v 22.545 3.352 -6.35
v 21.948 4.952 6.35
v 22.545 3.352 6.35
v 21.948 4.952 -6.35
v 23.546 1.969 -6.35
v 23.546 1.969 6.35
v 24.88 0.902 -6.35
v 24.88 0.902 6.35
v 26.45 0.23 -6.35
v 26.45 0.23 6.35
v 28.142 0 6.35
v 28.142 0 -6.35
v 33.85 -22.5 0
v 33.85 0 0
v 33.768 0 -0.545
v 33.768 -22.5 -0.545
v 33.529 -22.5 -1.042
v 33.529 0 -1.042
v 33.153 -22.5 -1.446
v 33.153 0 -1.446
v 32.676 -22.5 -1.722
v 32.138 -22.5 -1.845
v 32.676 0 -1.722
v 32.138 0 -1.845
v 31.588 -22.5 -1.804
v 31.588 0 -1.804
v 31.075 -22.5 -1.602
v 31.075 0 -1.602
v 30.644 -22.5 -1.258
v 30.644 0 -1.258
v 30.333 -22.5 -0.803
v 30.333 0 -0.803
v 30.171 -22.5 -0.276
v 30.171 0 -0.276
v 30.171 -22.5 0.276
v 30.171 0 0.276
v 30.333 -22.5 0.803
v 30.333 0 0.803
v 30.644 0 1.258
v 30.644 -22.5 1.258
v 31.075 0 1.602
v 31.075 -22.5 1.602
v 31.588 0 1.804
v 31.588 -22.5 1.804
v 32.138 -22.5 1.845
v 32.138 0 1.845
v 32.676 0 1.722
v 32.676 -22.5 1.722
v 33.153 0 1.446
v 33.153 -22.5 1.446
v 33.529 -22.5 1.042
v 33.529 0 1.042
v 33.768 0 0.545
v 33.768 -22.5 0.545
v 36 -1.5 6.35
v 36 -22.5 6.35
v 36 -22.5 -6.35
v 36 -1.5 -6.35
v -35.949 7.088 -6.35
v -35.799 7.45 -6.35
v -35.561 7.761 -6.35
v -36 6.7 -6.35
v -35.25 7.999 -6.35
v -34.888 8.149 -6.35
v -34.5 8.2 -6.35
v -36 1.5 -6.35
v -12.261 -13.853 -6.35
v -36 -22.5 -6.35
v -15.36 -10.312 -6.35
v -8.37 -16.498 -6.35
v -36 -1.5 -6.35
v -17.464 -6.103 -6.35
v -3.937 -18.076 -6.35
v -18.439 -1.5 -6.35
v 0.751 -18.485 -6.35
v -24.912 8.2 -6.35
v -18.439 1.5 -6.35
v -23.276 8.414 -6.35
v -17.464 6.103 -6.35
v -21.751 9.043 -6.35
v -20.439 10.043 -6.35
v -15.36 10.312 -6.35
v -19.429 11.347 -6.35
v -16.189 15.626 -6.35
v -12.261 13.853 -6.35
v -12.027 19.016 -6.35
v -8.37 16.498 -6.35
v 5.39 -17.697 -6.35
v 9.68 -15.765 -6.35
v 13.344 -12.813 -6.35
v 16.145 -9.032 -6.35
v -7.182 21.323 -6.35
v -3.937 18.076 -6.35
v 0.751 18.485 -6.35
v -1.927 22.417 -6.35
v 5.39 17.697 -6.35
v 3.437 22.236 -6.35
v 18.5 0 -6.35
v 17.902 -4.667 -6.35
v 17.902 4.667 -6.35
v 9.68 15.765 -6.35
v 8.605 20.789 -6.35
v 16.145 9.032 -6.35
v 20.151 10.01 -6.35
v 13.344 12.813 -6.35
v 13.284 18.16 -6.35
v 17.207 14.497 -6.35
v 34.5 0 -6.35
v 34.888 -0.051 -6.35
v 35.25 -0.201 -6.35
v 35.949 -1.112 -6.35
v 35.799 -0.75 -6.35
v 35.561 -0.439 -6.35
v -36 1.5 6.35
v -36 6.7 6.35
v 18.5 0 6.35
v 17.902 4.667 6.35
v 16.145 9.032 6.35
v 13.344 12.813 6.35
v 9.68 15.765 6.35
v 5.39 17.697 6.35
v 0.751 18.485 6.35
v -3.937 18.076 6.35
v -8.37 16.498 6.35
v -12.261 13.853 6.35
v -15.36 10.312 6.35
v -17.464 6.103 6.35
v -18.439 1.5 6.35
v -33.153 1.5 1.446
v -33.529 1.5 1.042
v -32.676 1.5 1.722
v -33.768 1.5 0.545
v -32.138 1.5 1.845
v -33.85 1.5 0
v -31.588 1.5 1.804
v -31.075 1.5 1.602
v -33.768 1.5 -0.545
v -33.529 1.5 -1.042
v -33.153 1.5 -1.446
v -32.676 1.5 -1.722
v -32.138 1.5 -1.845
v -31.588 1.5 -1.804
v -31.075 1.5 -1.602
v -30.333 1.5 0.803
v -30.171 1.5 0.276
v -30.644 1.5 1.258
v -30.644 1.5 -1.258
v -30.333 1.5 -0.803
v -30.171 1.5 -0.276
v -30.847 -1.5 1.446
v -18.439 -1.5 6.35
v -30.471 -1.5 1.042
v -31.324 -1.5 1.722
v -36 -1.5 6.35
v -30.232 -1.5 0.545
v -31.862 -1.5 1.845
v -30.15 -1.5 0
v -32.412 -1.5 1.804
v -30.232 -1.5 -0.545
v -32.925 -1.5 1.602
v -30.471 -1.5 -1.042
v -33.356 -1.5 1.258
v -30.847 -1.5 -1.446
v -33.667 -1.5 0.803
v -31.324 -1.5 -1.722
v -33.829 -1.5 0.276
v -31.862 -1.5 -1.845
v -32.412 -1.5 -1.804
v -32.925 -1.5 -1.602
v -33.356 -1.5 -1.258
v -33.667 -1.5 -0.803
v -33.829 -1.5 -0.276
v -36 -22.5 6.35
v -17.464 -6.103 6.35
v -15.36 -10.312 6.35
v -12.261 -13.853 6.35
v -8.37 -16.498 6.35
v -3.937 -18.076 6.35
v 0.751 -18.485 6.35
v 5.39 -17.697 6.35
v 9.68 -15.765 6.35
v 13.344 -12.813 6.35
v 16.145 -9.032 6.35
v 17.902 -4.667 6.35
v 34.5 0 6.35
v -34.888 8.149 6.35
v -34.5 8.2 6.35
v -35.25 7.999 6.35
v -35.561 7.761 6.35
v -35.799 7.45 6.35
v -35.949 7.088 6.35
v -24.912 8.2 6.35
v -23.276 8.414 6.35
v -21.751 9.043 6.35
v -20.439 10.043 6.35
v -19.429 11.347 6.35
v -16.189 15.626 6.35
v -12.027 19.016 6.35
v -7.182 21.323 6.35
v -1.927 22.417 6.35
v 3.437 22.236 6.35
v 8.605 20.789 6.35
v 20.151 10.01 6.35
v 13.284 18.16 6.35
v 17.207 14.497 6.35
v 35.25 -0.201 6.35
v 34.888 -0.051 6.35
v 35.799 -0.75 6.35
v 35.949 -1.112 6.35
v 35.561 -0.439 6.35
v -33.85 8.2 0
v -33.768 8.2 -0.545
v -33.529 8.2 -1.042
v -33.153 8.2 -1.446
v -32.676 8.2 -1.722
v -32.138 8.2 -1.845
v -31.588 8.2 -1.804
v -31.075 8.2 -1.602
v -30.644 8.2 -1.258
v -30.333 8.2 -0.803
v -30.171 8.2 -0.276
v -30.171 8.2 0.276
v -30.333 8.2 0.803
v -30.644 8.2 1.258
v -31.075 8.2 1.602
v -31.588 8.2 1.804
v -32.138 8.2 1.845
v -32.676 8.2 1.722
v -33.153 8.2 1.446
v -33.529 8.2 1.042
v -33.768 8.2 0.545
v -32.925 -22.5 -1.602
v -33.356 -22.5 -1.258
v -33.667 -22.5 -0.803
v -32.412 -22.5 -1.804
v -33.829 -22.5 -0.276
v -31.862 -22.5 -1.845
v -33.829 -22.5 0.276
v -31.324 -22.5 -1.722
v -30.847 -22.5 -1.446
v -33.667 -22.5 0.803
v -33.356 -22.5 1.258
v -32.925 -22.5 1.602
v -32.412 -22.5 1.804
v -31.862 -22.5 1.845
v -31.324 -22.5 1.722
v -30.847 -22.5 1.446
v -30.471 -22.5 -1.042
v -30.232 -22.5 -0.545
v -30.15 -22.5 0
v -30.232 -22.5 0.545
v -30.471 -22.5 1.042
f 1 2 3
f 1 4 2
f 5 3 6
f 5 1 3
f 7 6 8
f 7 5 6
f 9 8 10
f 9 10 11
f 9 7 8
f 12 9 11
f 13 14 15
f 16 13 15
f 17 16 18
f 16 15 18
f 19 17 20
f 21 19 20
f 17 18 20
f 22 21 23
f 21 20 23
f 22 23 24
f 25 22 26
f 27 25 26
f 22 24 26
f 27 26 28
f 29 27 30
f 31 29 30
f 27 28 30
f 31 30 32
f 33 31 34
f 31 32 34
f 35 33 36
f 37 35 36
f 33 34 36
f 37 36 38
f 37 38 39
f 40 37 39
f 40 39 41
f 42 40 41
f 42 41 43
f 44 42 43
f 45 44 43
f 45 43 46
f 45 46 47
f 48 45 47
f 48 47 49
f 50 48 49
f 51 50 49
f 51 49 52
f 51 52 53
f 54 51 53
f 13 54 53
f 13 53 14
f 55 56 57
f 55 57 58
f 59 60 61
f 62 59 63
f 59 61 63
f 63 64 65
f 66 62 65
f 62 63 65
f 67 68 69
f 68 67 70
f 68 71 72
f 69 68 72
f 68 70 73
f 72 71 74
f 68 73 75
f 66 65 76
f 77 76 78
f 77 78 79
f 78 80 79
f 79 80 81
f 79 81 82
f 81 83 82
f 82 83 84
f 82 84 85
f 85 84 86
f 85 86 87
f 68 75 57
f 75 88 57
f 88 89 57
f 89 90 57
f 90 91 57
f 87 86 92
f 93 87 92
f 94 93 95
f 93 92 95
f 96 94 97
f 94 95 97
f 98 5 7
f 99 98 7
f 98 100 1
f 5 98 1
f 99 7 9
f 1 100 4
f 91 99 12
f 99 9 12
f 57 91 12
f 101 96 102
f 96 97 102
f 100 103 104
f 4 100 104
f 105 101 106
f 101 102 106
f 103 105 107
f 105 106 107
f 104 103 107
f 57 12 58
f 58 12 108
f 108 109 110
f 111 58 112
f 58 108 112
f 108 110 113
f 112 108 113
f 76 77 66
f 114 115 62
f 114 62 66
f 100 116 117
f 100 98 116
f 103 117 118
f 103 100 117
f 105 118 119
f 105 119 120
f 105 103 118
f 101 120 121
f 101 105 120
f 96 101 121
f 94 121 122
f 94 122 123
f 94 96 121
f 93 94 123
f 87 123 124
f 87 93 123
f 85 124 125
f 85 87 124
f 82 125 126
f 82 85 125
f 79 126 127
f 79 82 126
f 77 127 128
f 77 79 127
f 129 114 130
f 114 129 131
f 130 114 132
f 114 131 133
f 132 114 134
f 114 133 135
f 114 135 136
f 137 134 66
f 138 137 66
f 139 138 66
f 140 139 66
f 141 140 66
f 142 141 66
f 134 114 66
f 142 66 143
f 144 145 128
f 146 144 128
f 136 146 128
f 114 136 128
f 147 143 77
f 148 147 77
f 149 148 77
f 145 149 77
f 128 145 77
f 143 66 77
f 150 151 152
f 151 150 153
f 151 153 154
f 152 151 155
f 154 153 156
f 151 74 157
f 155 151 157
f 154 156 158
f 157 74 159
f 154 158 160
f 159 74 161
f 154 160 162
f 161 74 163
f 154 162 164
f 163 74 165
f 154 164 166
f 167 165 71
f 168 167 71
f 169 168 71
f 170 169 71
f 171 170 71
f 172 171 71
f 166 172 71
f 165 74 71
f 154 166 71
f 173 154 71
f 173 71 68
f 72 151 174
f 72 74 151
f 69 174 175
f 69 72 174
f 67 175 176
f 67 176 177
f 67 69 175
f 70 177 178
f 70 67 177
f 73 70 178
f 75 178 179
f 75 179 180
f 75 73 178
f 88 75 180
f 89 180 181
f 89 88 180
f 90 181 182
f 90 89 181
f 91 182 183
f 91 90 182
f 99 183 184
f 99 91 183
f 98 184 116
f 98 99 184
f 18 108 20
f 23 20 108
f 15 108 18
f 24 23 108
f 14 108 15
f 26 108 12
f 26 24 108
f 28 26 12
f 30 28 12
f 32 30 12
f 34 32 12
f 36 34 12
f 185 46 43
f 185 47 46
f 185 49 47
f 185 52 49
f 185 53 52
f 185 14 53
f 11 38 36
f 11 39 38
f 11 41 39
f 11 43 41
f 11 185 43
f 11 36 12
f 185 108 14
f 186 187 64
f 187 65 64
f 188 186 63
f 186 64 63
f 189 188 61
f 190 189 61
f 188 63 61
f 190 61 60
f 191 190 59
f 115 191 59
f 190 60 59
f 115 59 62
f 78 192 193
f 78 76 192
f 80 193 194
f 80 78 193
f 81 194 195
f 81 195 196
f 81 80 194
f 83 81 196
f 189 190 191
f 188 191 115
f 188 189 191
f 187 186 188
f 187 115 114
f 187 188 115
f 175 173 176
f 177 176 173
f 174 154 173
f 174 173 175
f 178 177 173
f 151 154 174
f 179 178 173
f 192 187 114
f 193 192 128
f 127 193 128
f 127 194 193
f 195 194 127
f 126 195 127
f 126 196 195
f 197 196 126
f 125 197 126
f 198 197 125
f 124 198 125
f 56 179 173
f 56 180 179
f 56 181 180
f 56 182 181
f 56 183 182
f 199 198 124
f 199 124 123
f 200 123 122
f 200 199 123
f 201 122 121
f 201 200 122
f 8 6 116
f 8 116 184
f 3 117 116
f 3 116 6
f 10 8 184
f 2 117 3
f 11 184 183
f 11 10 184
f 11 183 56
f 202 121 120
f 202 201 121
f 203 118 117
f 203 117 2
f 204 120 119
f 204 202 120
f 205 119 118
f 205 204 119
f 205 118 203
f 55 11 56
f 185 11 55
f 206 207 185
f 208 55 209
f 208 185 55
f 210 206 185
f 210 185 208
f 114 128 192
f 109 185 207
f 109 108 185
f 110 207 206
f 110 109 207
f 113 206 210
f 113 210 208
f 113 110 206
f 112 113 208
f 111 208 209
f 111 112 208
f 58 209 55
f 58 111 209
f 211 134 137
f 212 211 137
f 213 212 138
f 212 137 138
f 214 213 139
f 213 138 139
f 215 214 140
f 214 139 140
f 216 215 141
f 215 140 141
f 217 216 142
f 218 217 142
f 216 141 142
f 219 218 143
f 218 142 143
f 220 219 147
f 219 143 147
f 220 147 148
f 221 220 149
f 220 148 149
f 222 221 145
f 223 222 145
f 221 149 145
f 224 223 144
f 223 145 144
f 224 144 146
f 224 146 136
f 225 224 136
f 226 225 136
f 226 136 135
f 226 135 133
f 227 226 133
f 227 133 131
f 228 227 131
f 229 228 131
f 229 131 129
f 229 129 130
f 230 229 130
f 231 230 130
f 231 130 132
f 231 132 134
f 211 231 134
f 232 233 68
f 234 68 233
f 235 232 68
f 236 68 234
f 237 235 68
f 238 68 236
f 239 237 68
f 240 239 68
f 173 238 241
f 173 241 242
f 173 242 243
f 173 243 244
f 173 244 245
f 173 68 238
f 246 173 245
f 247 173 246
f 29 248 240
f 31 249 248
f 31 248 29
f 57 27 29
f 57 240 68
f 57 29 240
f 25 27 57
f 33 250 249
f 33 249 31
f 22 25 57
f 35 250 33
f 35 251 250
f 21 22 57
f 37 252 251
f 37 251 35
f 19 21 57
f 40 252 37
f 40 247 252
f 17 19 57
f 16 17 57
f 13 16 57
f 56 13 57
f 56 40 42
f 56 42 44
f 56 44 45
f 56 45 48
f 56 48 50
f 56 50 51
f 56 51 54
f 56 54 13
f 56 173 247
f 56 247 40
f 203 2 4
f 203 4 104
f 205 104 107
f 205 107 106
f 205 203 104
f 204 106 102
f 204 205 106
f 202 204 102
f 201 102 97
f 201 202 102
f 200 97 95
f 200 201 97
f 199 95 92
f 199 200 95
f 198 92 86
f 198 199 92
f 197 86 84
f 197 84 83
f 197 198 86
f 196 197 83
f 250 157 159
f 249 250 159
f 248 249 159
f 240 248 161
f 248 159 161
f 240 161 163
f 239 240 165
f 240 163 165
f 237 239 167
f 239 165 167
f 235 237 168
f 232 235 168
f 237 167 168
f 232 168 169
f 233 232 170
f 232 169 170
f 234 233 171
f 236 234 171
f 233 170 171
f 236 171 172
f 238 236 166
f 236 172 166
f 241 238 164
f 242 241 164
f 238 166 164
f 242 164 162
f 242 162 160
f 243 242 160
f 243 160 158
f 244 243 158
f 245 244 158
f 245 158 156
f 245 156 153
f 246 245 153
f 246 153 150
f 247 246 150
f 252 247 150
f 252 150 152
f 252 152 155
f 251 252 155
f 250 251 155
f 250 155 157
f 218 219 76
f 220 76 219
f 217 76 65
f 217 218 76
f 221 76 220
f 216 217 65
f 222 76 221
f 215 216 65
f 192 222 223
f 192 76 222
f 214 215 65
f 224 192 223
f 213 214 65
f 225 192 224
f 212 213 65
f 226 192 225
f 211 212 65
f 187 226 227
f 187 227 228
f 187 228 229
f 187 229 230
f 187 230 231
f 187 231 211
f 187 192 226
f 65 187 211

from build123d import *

# Parameters (mm, degrees)
BOSS_EXTRUDE1_DEPTH            = 12.7
CUT_EXTRUDE1_DEPTH             = 13.7
SKETCH3_W                      = 18.5
SKETCH3_H                      = 12.7
F_3_7_3_7_DIAMETER_HOLE1_D     = 3.7
F_3_7_3_7_DIAMETER_HOLE1_DEPTH = 6.7
F_3_7_3_7_DIAMETER_HOLE2_D     = 3.7
F_3_7_3_7_DIAMETER_HOLE2_DEPTH = 45
F_3_7_3_7_DIAMETER_HOLE3_D     = 3.7
F_3_7_3_7_DIAMETER_HOLE3_DEPTH = 45
FILLET1_R                      = 1.5
FILLET2_R                      = 6.35


with BuildPart() as part:
    # Sketch1 → Boss-Extrude1 (new body)
    with BuildSketch(Plane.XY.offset(6.35)):
        with BuildLine():
            Line((-20.952565475, 8.2), (-36, 8.2))
            Line((-36, 8.2), (-36, -22.5))
            Line((-36, -22.5), (36, -22.5))
            Line((36, -22.5), (36, 0))
            Line((36, 0), (22.5, 0))
            ThreePointArc((22.5, 0), (4.172366044, 22.109757158), (-20.952565475, 8.2))
        make_face()
    extrude(amount=-BOSS_EXTRUDE1_DEPTH)

    # Sketch2 → Cut-Extrude1 (cut, through all)
    with BuildSketch(Plane(origin=(0, 0, -6.35), x_dir=(-1, 0, 0), z_dir=(0, 0, -1))):
        with BuildLine():
            Line((36, 1.5), (18.439088915, 1.5))
            ThreePointArc((18.439088915, 1.5), (18.5, 0), (18.439088915, -1.5))
            Line((18.439088915, -1.5), (36, -1.5))
            Line((36, -1.5), (36, 1.5))
        make_face()
    extrude(amount=-CUT_EXTRUDE1_DEPTH, mode=Mode.SUBTRACT)

    # Sketch3 → Cut-Revolve1 (revolve, cut)
    with BuildSketch(Plane(origin=(0, 0, 0), x_dir=(1, 0, 0), z_dir=(0, 1, 0))):
        with Locations((9.25, 0)):
            Rectangle(SKETCH3_W, SKETCH3_H)
    revolve(axis=Axis((0, 0, -6.35), (0, 0, 1)), mode=Mode.SUBTRACT)

    # Ø3.7 (3.7) Diameter Hole1
    with Locations(Plane(origin=(0, 8.2, 0), x_dir=(1, 0, 0), z_dir=(0, 1, 0))):
        with Locations((-32, 0)):
            Hole(F_3_7_3_7_DIAMETER_HOLE1_D / 2, depth=F_3_7_3_7_DIAMETER_HOLE1_DEPTH)

    # Ø3.7 (3.7) Diameter Hole2
    with Locations(Plane(origin=(0, -22.5, 0), x_dir=(-1, 0, 0), z_dir=(0, -1, 0))):
        with Locations((32, 0)):
            Hole(F_3_7_3_7_DIAMETER_HOLE2_D / 2, depth=F_3_7_3_7_DIAMETER_HOLE2_DEPTH)

    # Ø3.7 (3.7) Diameter Hole3
    with Locations(Plane(origin=(0, -22.5, 0), x_dir=(-1, 0, 0), z_dir=(0, -1, 0))):
        with Locations((-32, 0)):
            Hole(F_3_7_3_7_DIAMETER_HOLE3_D / 2, depth=F_3_7_3_7_DIAMETER_HOLE3_DEPTH)

    # Fillet1
    fillet1_edges = [part.edges().sort_by_distance(p)[0] for p in [
        (36, 0, 0),
        (-36, 8.2, 0),
    ]]
    fillet(fillet1_edges, radius=FILLET1_R)

    # Fillet2
    fillet2_edges = [part.edges().sort_by_distance(p)[0] for p in [
        (22.5, 0, 0),
        (-20.952565475, 8.2, 0),
    ]]
    fillet(fillet2_edges, radius=FILLET2_R)


solid = part.part
